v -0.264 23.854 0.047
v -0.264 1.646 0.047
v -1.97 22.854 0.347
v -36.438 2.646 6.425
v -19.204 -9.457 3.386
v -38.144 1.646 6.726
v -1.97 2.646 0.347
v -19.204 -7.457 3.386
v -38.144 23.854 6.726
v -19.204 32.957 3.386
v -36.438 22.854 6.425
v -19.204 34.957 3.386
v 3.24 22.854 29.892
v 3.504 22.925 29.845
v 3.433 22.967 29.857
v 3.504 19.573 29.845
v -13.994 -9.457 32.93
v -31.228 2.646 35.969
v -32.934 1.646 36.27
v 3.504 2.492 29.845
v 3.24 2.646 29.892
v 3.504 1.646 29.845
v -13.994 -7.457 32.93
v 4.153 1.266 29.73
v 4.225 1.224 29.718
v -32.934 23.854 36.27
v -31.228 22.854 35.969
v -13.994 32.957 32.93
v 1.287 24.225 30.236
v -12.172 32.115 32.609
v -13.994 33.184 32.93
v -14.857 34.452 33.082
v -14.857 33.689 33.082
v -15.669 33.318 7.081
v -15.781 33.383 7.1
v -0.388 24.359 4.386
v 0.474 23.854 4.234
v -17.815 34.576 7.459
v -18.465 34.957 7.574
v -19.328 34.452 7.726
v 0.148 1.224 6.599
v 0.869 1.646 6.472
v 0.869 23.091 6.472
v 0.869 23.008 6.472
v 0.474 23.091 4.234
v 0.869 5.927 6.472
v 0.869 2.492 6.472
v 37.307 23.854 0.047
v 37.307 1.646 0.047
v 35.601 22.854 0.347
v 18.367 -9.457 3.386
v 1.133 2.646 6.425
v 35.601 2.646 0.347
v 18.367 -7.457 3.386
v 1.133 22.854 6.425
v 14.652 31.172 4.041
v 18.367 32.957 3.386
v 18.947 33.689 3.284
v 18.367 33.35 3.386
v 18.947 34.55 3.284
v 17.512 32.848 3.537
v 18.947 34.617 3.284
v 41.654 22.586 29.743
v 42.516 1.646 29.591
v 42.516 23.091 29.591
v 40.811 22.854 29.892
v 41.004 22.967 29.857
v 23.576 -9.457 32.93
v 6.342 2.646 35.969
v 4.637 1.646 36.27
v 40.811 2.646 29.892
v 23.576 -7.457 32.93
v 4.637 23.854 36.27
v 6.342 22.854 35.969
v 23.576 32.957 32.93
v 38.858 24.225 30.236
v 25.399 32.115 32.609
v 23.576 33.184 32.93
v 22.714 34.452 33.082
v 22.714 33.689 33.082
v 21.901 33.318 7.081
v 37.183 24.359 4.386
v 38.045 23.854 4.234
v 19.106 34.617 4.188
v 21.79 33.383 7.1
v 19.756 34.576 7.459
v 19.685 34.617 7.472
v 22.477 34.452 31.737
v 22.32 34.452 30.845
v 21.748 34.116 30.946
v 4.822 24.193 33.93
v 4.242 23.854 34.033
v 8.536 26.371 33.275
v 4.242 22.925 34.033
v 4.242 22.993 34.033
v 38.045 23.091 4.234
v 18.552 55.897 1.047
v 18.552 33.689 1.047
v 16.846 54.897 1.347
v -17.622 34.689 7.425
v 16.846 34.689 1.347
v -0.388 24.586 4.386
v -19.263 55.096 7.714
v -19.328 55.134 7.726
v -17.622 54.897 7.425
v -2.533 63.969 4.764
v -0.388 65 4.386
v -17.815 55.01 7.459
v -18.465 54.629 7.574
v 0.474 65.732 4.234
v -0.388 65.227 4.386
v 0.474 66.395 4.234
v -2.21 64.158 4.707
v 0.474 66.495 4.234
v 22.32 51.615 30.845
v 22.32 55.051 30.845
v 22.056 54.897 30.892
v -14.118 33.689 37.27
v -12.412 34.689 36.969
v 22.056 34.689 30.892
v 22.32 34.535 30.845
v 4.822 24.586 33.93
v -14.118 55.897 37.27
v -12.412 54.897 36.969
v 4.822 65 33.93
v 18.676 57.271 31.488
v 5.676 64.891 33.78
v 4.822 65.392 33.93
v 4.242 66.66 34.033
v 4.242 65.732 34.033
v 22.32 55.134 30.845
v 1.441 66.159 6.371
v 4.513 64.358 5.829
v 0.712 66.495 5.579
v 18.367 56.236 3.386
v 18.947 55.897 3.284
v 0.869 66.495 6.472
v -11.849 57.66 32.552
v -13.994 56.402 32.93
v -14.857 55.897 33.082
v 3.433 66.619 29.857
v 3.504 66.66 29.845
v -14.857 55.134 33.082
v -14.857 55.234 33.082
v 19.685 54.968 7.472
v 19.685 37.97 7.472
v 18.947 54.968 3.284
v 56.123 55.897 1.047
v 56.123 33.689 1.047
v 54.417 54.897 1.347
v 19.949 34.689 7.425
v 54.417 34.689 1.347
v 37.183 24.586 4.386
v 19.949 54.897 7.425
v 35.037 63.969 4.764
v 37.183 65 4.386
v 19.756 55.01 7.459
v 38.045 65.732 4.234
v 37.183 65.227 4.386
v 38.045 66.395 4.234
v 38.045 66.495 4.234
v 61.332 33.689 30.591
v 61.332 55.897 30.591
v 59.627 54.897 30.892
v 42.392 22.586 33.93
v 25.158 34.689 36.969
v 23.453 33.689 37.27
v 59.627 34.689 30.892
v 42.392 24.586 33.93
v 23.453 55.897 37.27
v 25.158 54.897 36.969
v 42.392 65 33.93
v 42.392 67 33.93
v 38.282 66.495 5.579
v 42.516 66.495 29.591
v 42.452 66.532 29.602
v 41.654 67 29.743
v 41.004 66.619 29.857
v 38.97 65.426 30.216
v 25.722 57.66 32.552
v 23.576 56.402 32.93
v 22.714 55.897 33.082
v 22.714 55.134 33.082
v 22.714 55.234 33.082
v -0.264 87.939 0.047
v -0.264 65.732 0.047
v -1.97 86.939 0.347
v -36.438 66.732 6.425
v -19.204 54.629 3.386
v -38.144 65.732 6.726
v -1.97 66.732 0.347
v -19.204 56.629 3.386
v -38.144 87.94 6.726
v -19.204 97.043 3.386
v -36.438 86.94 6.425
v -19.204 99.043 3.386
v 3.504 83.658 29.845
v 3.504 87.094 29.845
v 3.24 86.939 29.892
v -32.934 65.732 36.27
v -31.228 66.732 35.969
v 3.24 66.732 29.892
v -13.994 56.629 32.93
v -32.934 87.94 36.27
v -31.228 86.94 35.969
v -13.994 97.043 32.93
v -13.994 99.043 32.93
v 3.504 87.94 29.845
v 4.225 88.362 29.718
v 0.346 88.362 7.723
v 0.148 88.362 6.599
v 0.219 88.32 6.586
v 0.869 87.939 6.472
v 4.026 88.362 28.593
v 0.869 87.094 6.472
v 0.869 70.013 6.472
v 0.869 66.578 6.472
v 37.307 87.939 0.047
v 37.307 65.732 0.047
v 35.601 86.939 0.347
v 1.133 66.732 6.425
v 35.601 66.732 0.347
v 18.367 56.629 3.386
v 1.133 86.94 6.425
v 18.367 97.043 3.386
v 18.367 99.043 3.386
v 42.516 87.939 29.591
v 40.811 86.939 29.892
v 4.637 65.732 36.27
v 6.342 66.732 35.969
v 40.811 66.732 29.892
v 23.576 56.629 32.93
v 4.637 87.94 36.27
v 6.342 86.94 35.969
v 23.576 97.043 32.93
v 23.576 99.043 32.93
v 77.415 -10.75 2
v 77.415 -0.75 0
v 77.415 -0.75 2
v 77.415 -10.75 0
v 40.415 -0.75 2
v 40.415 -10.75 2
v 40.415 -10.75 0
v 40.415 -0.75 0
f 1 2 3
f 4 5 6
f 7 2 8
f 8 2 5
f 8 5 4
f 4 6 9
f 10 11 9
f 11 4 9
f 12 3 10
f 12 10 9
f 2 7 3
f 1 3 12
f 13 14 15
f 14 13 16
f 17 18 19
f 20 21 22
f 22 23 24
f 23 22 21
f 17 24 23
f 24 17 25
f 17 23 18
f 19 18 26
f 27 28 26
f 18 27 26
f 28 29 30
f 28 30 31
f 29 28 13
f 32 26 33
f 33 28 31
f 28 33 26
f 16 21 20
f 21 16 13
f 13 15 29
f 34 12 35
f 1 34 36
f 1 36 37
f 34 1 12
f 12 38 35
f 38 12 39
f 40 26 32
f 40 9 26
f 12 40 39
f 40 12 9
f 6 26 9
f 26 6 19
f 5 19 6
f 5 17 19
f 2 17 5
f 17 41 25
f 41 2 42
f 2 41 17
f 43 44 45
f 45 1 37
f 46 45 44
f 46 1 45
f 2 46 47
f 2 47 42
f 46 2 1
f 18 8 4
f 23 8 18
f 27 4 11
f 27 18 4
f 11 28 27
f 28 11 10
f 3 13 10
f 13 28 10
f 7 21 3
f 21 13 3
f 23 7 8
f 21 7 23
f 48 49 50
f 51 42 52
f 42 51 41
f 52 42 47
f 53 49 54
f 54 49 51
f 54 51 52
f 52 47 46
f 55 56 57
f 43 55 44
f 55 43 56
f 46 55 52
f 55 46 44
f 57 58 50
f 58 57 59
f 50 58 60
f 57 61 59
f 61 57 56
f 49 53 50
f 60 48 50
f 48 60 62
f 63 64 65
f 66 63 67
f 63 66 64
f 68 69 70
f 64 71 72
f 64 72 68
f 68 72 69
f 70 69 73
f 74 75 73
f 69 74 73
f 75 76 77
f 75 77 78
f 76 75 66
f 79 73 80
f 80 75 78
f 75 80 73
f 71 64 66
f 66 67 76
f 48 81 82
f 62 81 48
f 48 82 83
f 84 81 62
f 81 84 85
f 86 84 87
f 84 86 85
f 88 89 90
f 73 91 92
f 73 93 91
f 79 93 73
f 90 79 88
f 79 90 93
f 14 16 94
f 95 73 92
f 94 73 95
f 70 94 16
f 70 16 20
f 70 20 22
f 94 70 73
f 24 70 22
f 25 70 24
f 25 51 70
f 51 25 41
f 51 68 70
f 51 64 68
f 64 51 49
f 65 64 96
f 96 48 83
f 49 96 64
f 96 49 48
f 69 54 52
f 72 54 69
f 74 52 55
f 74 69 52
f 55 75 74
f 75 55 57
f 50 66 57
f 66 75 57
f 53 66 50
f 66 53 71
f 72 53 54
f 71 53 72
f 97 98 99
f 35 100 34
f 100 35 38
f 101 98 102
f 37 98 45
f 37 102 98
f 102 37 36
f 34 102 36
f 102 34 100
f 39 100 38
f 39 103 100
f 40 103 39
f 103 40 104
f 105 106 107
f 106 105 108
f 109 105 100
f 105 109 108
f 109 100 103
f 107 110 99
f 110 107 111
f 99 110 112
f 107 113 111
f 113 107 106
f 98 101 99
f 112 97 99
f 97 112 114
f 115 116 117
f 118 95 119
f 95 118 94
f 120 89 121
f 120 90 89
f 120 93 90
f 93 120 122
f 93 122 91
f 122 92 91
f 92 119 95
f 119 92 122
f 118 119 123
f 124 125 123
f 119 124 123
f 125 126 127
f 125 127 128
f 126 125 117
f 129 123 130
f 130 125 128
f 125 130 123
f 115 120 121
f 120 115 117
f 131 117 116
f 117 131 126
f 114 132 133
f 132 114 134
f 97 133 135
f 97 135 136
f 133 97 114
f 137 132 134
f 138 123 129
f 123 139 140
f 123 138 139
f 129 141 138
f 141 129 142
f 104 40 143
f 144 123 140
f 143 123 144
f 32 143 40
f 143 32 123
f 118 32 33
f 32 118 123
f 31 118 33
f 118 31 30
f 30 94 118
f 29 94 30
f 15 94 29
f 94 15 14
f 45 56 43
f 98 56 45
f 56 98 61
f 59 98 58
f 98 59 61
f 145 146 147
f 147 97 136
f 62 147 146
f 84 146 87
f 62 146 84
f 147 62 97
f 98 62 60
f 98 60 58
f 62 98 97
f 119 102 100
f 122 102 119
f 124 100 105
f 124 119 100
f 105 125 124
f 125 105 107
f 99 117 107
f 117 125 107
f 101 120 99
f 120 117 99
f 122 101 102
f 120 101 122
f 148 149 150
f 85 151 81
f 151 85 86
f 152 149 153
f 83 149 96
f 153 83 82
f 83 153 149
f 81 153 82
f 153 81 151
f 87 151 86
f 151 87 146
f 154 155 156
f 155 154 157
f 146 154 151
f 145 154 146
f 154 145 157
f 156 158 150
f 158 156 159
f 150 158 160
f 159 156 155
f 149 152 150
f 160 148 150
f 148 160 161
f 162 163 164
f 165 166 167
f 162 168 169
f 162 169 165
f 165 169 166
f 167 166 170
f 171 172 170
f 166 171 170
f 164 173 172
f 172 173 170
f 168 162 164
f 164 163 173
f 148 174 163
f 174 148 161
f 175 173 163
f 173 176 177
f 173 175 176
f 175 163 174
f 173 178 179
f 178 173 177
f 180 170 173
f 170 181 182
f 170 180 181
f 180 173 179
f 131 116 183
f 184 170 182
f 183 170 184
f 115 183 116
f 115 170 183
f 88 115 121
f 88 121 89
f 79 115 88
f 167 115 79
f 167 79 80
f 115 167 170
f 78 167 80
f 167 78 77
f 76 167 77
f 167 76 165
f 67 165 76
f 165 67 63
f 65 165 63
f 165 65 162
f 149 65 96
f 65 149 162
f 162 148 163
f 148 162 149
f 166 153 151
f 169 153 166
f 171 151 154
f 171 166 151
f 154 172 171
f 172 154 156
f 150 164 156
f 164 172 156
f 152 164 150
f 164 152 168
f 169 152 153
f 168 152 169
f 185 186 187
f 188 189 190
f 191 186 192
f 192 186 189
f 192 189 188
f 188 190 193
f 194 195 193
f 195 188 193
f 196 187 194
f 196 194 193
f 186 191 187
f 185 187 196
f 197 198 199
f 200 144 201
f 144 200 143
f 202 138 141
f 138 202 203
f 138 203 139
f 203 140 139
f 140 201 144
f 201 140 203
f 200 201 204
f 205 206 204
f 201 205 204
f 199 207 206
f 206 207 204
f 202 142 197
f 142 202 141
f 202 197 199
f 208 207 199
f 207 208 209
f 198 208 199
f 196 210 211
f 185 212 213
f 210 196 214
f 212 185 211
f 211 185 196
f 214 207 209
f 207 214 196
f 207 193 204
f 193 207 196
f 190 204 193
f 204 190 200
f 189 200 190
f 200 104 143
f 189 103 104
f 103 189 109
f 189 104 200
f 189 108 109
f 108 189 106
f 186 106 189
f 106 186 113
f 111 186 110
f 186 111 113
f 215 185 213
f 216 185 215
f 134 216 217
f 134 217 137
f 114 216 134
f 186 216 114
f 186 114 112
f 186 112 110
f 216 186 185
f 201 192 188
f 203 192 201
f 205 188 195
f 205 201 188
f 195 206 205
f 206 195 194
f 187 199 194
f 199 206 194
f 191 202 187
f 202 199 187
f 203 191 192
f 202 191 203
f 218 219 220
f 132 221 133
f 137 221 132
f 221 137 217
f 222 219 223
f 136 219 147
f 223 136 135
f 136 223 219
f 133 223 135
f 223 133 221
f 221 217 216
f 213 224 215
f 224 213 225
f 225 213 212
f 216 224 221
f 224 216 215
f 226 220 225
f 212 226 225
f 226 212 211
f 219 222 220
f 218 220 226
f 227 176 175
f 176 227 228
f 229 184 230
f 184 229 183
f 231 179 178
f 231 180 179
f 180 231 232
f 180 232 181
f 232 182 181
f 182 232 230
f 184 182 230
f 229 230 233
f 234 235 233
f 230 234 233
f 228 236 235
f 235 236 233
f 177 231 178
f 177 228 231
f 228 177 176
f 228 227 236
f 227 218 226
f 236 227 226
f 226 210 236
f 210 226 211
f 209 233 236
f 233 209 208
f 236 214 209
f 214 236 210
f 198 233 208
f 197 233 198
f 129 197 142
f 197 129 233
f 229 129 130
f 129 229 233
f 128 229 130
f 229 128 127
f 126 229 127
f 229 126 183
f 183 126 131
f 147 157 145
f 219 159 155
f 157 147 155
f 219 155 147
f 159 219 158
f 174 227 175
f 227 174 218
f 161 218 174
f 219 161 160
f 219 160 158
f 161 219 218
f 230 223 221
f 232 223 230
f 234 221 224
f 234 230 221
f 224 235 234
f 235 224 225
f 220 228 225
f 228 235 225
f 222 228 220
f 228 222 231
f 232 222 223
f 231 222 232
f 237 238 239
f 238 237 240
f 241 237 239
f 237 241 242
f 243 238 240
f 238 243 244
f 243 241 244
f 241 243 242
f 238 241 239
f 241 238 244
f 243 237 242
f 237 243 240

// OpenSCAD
//User Entered Values
wallThickness = 2;
minDiameter = 35;
height = 30;
tiltDeg = 10;
numColumns = 2;


//Calculated Values
minRad = minDiameter/2;
minRadWall = minRad+wallThickness;
minDiam = minRadWall*2;
rad = 2*minRad / sqrt(3);
diam = rad*2;
evenRowBaseOffset = (minDiam-wallThickness)*cos(tiltDeg);

//Execute
buildRow();
buildPlate();
    //middle
translate([(evenRowBaseOffset+(minDiam)*sin(tiltDeg)/tan(90-tiltDeg))/2,diam-rad/2+wallThickness*cos(30),1])
buildRow();
    //third
translate([0,diam+rad+wallThickness*cos(30)*2,0])
buildRow();

//modules
module buildRow(){  
    for(col = [0:1:numColumns-1])   
        shiftX(col)       
        tiltHex(tiltDeg)  
        buildHex();
}

module buildHex(){
    linear_extrude(height)
    translate([-minRad-wallThickness,minRad/2+wallThickness*2,0])   
    rotate(30)
    difference(){
        circle(rad+wallThickness, $fn=6);
        circle(rad, $fn=6);
    };
}

module shiftX(units){
    translate([units*((minDiameter+wallThickness)*cos(tiltDeg)+(minDiameter+wallThickness)*sin(tiltDeg)/tan(90-tiltDeg)), 0, 0])
    {
        for(i=[0:$children-1])
          children(i);
    }
}

module  tiltHex(deg){
    rotate([0,deg,0]){
        for(i=[0:$children-1])
          children(i);
    }
}

module buildPlate(){
translate([diam ,-minRad/2-wallThickness,0])
cube([minDiameter+wallThickness,10,wallThickness]);

}
